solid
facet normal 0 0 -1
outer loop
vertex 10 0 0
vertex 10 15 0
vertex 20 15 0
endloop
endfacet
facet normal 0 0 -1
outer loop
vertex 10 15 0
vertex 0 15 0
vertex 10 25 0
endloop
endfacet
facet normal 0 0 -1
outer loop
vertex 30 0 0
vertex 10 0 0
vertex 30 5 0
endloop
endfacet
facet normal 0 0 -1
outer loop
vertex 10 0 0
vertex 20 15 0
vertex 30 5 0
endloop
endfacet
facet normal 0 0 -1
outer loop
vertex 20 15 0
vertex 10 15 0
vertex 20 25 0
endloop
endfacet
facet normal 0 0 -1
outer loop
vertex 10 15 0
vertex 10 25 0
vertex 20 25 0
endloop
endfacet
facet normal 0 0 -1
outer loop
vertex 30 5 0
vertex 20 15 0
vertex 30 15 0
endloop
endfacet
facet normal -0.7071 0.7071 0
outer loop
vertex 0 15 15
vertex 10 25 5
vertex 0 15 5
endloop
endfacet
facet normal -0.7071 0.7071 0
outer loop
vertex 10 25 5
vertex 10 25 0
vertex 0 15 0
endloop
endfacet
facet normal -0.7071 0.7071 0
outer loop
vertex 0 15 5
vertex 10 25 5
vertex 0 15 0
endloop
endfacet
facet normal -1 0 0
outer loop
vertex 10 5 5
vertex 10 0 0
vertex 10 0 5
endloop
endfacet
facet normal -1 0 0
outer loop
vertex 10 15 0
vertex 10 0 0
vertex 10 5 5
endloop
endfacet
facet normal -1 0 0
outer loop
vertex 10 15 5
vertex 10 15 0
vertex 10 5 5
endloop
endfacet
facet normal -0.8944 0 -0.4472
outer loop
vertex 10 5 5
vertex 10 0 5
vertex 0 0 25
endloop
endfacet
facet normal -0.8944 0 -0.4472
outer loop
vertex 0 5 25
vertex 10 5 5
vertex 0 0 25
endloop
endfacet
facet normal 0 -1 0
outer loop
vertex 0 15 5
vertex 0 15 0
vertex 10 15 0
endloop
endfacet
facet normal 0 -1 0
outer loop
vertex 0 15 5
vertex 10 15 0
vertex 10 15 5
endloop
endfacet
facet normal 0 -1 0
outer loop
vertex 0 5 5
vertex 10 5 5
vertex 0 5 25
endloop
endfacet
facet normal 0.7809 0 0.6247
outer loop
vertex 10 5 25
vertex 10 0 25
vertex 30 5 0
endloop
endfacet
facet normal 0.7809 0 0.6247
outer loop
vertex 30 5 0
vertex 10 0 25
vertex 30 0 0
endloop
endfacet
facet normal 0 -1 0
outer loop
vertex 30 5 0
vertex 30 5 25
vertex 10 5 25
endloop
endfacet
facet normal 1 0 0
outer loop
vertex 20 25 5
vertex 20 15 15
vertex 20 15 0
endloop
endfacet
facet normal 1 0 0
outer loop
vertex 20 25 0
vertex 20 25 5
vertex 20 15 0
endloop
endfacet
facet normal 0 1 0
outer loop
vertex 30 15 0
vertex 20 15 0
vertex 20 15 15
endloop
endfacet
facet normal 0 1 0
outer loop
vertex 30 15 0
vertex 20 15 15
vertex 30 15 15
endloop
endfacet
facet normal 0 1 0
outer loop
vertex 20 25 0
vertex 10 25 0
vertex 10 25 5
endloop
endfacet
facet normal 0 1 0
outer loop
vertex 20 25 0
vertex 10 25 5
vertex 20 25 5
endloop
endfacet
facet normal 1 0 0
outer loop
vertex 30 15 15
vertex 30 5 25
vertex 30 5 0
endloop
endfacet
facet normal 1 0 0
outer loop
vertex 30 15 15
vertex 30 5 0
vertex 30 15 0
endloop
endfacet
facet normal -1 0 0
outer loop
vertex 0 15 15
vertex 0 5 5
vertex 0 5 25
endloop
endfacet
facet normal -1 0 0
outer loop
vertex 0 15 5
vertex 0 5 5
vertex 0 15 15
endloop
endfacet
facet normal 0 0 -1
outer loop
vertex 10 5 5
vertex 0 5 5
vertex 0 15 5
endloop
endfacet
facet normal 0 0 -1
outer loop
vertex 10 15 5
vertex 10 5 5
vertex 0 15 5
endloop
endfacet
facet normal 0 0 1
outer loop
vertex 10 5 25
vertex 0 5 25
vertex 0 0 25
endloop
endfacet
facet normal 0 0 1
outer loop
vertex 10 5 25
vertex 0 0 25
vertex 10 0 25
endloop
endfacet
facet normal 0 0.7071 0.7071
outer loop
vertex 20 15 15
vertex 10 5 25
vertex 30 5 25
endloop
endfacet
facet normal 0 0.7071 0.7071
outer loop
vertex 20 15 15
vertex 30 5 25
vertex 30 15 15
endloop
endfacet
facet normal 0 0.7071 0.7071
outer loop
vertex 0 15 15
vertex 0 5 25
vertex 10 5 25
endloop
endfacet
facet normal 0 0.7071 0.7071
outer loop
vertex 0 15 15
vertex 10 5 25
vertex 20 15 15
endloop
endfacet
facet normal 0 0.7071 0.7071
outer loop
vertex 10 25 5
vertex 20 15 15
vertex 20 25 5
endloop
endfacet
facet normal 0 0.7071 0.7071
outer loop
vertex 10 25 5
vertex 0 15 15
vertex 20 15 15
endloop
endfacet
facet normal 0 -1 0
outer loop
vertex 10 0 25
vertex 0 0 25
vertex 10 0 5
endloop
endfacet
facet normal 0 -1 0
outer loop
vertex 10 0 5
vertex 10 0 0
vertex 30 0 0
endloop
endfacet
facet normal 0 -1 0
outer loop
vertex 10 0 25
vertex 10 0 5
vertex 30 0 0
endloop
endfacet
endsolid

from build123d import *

# Parameters (mm, degrees)
SKETCH5_W           = 30
SKETCH5_H           = 25
BOSS_EXTRUDE2_DEPTH = 25
CUT_EXTRUDE2_DEPTH  = 30
SKETCH7_W           = 5
SKETCH7_H           = 15
CUT_EXTRUDE3_DEPTH  = 10
CUT_EXTRUDE4_DEPTH  = 5
SKETCH12_W          = 10
SKETCH12_H          = 10
CUT_EXTRUDE7_DEPTH  = 10
CUT_EXTRUDE8_DEPTH  = 10
CUT_EXTRUDE9_DEPTH  = 20
CUT_EXTRUDE12_DEPTH = 5


with BuildPart() as part:
    # Sketch5 → Boss-Extrude2 (new body)
    with BuildSketch(Plane.XY):
        with Locations((15, 12.5)):
            Rectangle(SKETCH5_W, SKETCH5_H)
    extrude(amount=BOSS_EXTRUDE2_DEPTH)

    # Sketch6 → Cut-Extrude2 (cut)
    with BuildSketch(Plane.ZY):
        Polygon((25, 25), (25, 5), (5, 25), align=None)
    extrude(amount=-CUT_EXTRUDE2_DEPTH, mode=Mode.SUBTRACT)

    # Sketch7 → Cut-Extrude3 (cut)
    with BuildSketch(Plane.ZY):
        with Locations((2.5, 7.5)):
            Rectangle(SKETCH7_W, SKETCH7_H)
    extrude(amount=-CUT_EXTRUDE3_DEPTH, mode=Mode.SUBTRACT)

    # Sketch9 → Cut-Extrude4 (cut)
    with BuildSketch(Plane(origin=(0, 0, 0), x_dir=(-1, 0, 0), z_dir=(0, -1, 0))):
        Polygon((0, -25), (0, -5), (-10, -5), align=None)
    extrude(amount=-CUT_EXTRUDE4_DEPTH, mode=Mode.SUBTRACT)

    # Sketch12 → Cut-Extrude7 (cut)
    with BuildSketch(Plane(origin=(0, 25, 0), x_dir=(1, 0, 0), z_dir=(0, 1, 0))):
        with Locations((25, -5)):
            Rectangle(SKETCH12_W, SKETCH12_H)
    extrude(amount=-CUT_EXTRUDE7_DEPTH, mode=Mode.SUBTRACT)

    # Sketch13 → Cut-Extrude8 (cut)
    with BuildSketch(Plane(origin=(30, 0, 0), x_dir=(0, 0, -1), z_dir=(1, 0, 0))):
        Polygon((-10, 15), (-15, 15), (-10, 20), align=None)
    extrude(amount=-CUT_EXTRUDE8_DEPTH, mode=Mode.SUBTRACT)

    # Sketch14 → Cut-Extrude9 (cut)
    with BuildSketch(Plane(origin=(0, 0, 0), x_dir=(-1, 0, 0), z_dir=(0, 0, -1))):
        Polygon((0, 25), (-10, 25), (0, 15), align=None)
    extrude(amount=-CUT_EXTRUDE9_DEPTH, mode=Mode.SUBTRACT)

    # Sketch15 → Cut-Extrude12 (cut)
    with BuildSketch(Plane(origin=(0, 0, 0), x_dir=(-1, 0, 0), z_dir=(0, -1, 0))):
        Polygon((-30, 0), (-30, -25), (-10, -25), align=None)
    extrude(amount=-CUT_EXTRUDE12_DEPTH, mode=Mode.SUBTRACT)


solid = part.part
